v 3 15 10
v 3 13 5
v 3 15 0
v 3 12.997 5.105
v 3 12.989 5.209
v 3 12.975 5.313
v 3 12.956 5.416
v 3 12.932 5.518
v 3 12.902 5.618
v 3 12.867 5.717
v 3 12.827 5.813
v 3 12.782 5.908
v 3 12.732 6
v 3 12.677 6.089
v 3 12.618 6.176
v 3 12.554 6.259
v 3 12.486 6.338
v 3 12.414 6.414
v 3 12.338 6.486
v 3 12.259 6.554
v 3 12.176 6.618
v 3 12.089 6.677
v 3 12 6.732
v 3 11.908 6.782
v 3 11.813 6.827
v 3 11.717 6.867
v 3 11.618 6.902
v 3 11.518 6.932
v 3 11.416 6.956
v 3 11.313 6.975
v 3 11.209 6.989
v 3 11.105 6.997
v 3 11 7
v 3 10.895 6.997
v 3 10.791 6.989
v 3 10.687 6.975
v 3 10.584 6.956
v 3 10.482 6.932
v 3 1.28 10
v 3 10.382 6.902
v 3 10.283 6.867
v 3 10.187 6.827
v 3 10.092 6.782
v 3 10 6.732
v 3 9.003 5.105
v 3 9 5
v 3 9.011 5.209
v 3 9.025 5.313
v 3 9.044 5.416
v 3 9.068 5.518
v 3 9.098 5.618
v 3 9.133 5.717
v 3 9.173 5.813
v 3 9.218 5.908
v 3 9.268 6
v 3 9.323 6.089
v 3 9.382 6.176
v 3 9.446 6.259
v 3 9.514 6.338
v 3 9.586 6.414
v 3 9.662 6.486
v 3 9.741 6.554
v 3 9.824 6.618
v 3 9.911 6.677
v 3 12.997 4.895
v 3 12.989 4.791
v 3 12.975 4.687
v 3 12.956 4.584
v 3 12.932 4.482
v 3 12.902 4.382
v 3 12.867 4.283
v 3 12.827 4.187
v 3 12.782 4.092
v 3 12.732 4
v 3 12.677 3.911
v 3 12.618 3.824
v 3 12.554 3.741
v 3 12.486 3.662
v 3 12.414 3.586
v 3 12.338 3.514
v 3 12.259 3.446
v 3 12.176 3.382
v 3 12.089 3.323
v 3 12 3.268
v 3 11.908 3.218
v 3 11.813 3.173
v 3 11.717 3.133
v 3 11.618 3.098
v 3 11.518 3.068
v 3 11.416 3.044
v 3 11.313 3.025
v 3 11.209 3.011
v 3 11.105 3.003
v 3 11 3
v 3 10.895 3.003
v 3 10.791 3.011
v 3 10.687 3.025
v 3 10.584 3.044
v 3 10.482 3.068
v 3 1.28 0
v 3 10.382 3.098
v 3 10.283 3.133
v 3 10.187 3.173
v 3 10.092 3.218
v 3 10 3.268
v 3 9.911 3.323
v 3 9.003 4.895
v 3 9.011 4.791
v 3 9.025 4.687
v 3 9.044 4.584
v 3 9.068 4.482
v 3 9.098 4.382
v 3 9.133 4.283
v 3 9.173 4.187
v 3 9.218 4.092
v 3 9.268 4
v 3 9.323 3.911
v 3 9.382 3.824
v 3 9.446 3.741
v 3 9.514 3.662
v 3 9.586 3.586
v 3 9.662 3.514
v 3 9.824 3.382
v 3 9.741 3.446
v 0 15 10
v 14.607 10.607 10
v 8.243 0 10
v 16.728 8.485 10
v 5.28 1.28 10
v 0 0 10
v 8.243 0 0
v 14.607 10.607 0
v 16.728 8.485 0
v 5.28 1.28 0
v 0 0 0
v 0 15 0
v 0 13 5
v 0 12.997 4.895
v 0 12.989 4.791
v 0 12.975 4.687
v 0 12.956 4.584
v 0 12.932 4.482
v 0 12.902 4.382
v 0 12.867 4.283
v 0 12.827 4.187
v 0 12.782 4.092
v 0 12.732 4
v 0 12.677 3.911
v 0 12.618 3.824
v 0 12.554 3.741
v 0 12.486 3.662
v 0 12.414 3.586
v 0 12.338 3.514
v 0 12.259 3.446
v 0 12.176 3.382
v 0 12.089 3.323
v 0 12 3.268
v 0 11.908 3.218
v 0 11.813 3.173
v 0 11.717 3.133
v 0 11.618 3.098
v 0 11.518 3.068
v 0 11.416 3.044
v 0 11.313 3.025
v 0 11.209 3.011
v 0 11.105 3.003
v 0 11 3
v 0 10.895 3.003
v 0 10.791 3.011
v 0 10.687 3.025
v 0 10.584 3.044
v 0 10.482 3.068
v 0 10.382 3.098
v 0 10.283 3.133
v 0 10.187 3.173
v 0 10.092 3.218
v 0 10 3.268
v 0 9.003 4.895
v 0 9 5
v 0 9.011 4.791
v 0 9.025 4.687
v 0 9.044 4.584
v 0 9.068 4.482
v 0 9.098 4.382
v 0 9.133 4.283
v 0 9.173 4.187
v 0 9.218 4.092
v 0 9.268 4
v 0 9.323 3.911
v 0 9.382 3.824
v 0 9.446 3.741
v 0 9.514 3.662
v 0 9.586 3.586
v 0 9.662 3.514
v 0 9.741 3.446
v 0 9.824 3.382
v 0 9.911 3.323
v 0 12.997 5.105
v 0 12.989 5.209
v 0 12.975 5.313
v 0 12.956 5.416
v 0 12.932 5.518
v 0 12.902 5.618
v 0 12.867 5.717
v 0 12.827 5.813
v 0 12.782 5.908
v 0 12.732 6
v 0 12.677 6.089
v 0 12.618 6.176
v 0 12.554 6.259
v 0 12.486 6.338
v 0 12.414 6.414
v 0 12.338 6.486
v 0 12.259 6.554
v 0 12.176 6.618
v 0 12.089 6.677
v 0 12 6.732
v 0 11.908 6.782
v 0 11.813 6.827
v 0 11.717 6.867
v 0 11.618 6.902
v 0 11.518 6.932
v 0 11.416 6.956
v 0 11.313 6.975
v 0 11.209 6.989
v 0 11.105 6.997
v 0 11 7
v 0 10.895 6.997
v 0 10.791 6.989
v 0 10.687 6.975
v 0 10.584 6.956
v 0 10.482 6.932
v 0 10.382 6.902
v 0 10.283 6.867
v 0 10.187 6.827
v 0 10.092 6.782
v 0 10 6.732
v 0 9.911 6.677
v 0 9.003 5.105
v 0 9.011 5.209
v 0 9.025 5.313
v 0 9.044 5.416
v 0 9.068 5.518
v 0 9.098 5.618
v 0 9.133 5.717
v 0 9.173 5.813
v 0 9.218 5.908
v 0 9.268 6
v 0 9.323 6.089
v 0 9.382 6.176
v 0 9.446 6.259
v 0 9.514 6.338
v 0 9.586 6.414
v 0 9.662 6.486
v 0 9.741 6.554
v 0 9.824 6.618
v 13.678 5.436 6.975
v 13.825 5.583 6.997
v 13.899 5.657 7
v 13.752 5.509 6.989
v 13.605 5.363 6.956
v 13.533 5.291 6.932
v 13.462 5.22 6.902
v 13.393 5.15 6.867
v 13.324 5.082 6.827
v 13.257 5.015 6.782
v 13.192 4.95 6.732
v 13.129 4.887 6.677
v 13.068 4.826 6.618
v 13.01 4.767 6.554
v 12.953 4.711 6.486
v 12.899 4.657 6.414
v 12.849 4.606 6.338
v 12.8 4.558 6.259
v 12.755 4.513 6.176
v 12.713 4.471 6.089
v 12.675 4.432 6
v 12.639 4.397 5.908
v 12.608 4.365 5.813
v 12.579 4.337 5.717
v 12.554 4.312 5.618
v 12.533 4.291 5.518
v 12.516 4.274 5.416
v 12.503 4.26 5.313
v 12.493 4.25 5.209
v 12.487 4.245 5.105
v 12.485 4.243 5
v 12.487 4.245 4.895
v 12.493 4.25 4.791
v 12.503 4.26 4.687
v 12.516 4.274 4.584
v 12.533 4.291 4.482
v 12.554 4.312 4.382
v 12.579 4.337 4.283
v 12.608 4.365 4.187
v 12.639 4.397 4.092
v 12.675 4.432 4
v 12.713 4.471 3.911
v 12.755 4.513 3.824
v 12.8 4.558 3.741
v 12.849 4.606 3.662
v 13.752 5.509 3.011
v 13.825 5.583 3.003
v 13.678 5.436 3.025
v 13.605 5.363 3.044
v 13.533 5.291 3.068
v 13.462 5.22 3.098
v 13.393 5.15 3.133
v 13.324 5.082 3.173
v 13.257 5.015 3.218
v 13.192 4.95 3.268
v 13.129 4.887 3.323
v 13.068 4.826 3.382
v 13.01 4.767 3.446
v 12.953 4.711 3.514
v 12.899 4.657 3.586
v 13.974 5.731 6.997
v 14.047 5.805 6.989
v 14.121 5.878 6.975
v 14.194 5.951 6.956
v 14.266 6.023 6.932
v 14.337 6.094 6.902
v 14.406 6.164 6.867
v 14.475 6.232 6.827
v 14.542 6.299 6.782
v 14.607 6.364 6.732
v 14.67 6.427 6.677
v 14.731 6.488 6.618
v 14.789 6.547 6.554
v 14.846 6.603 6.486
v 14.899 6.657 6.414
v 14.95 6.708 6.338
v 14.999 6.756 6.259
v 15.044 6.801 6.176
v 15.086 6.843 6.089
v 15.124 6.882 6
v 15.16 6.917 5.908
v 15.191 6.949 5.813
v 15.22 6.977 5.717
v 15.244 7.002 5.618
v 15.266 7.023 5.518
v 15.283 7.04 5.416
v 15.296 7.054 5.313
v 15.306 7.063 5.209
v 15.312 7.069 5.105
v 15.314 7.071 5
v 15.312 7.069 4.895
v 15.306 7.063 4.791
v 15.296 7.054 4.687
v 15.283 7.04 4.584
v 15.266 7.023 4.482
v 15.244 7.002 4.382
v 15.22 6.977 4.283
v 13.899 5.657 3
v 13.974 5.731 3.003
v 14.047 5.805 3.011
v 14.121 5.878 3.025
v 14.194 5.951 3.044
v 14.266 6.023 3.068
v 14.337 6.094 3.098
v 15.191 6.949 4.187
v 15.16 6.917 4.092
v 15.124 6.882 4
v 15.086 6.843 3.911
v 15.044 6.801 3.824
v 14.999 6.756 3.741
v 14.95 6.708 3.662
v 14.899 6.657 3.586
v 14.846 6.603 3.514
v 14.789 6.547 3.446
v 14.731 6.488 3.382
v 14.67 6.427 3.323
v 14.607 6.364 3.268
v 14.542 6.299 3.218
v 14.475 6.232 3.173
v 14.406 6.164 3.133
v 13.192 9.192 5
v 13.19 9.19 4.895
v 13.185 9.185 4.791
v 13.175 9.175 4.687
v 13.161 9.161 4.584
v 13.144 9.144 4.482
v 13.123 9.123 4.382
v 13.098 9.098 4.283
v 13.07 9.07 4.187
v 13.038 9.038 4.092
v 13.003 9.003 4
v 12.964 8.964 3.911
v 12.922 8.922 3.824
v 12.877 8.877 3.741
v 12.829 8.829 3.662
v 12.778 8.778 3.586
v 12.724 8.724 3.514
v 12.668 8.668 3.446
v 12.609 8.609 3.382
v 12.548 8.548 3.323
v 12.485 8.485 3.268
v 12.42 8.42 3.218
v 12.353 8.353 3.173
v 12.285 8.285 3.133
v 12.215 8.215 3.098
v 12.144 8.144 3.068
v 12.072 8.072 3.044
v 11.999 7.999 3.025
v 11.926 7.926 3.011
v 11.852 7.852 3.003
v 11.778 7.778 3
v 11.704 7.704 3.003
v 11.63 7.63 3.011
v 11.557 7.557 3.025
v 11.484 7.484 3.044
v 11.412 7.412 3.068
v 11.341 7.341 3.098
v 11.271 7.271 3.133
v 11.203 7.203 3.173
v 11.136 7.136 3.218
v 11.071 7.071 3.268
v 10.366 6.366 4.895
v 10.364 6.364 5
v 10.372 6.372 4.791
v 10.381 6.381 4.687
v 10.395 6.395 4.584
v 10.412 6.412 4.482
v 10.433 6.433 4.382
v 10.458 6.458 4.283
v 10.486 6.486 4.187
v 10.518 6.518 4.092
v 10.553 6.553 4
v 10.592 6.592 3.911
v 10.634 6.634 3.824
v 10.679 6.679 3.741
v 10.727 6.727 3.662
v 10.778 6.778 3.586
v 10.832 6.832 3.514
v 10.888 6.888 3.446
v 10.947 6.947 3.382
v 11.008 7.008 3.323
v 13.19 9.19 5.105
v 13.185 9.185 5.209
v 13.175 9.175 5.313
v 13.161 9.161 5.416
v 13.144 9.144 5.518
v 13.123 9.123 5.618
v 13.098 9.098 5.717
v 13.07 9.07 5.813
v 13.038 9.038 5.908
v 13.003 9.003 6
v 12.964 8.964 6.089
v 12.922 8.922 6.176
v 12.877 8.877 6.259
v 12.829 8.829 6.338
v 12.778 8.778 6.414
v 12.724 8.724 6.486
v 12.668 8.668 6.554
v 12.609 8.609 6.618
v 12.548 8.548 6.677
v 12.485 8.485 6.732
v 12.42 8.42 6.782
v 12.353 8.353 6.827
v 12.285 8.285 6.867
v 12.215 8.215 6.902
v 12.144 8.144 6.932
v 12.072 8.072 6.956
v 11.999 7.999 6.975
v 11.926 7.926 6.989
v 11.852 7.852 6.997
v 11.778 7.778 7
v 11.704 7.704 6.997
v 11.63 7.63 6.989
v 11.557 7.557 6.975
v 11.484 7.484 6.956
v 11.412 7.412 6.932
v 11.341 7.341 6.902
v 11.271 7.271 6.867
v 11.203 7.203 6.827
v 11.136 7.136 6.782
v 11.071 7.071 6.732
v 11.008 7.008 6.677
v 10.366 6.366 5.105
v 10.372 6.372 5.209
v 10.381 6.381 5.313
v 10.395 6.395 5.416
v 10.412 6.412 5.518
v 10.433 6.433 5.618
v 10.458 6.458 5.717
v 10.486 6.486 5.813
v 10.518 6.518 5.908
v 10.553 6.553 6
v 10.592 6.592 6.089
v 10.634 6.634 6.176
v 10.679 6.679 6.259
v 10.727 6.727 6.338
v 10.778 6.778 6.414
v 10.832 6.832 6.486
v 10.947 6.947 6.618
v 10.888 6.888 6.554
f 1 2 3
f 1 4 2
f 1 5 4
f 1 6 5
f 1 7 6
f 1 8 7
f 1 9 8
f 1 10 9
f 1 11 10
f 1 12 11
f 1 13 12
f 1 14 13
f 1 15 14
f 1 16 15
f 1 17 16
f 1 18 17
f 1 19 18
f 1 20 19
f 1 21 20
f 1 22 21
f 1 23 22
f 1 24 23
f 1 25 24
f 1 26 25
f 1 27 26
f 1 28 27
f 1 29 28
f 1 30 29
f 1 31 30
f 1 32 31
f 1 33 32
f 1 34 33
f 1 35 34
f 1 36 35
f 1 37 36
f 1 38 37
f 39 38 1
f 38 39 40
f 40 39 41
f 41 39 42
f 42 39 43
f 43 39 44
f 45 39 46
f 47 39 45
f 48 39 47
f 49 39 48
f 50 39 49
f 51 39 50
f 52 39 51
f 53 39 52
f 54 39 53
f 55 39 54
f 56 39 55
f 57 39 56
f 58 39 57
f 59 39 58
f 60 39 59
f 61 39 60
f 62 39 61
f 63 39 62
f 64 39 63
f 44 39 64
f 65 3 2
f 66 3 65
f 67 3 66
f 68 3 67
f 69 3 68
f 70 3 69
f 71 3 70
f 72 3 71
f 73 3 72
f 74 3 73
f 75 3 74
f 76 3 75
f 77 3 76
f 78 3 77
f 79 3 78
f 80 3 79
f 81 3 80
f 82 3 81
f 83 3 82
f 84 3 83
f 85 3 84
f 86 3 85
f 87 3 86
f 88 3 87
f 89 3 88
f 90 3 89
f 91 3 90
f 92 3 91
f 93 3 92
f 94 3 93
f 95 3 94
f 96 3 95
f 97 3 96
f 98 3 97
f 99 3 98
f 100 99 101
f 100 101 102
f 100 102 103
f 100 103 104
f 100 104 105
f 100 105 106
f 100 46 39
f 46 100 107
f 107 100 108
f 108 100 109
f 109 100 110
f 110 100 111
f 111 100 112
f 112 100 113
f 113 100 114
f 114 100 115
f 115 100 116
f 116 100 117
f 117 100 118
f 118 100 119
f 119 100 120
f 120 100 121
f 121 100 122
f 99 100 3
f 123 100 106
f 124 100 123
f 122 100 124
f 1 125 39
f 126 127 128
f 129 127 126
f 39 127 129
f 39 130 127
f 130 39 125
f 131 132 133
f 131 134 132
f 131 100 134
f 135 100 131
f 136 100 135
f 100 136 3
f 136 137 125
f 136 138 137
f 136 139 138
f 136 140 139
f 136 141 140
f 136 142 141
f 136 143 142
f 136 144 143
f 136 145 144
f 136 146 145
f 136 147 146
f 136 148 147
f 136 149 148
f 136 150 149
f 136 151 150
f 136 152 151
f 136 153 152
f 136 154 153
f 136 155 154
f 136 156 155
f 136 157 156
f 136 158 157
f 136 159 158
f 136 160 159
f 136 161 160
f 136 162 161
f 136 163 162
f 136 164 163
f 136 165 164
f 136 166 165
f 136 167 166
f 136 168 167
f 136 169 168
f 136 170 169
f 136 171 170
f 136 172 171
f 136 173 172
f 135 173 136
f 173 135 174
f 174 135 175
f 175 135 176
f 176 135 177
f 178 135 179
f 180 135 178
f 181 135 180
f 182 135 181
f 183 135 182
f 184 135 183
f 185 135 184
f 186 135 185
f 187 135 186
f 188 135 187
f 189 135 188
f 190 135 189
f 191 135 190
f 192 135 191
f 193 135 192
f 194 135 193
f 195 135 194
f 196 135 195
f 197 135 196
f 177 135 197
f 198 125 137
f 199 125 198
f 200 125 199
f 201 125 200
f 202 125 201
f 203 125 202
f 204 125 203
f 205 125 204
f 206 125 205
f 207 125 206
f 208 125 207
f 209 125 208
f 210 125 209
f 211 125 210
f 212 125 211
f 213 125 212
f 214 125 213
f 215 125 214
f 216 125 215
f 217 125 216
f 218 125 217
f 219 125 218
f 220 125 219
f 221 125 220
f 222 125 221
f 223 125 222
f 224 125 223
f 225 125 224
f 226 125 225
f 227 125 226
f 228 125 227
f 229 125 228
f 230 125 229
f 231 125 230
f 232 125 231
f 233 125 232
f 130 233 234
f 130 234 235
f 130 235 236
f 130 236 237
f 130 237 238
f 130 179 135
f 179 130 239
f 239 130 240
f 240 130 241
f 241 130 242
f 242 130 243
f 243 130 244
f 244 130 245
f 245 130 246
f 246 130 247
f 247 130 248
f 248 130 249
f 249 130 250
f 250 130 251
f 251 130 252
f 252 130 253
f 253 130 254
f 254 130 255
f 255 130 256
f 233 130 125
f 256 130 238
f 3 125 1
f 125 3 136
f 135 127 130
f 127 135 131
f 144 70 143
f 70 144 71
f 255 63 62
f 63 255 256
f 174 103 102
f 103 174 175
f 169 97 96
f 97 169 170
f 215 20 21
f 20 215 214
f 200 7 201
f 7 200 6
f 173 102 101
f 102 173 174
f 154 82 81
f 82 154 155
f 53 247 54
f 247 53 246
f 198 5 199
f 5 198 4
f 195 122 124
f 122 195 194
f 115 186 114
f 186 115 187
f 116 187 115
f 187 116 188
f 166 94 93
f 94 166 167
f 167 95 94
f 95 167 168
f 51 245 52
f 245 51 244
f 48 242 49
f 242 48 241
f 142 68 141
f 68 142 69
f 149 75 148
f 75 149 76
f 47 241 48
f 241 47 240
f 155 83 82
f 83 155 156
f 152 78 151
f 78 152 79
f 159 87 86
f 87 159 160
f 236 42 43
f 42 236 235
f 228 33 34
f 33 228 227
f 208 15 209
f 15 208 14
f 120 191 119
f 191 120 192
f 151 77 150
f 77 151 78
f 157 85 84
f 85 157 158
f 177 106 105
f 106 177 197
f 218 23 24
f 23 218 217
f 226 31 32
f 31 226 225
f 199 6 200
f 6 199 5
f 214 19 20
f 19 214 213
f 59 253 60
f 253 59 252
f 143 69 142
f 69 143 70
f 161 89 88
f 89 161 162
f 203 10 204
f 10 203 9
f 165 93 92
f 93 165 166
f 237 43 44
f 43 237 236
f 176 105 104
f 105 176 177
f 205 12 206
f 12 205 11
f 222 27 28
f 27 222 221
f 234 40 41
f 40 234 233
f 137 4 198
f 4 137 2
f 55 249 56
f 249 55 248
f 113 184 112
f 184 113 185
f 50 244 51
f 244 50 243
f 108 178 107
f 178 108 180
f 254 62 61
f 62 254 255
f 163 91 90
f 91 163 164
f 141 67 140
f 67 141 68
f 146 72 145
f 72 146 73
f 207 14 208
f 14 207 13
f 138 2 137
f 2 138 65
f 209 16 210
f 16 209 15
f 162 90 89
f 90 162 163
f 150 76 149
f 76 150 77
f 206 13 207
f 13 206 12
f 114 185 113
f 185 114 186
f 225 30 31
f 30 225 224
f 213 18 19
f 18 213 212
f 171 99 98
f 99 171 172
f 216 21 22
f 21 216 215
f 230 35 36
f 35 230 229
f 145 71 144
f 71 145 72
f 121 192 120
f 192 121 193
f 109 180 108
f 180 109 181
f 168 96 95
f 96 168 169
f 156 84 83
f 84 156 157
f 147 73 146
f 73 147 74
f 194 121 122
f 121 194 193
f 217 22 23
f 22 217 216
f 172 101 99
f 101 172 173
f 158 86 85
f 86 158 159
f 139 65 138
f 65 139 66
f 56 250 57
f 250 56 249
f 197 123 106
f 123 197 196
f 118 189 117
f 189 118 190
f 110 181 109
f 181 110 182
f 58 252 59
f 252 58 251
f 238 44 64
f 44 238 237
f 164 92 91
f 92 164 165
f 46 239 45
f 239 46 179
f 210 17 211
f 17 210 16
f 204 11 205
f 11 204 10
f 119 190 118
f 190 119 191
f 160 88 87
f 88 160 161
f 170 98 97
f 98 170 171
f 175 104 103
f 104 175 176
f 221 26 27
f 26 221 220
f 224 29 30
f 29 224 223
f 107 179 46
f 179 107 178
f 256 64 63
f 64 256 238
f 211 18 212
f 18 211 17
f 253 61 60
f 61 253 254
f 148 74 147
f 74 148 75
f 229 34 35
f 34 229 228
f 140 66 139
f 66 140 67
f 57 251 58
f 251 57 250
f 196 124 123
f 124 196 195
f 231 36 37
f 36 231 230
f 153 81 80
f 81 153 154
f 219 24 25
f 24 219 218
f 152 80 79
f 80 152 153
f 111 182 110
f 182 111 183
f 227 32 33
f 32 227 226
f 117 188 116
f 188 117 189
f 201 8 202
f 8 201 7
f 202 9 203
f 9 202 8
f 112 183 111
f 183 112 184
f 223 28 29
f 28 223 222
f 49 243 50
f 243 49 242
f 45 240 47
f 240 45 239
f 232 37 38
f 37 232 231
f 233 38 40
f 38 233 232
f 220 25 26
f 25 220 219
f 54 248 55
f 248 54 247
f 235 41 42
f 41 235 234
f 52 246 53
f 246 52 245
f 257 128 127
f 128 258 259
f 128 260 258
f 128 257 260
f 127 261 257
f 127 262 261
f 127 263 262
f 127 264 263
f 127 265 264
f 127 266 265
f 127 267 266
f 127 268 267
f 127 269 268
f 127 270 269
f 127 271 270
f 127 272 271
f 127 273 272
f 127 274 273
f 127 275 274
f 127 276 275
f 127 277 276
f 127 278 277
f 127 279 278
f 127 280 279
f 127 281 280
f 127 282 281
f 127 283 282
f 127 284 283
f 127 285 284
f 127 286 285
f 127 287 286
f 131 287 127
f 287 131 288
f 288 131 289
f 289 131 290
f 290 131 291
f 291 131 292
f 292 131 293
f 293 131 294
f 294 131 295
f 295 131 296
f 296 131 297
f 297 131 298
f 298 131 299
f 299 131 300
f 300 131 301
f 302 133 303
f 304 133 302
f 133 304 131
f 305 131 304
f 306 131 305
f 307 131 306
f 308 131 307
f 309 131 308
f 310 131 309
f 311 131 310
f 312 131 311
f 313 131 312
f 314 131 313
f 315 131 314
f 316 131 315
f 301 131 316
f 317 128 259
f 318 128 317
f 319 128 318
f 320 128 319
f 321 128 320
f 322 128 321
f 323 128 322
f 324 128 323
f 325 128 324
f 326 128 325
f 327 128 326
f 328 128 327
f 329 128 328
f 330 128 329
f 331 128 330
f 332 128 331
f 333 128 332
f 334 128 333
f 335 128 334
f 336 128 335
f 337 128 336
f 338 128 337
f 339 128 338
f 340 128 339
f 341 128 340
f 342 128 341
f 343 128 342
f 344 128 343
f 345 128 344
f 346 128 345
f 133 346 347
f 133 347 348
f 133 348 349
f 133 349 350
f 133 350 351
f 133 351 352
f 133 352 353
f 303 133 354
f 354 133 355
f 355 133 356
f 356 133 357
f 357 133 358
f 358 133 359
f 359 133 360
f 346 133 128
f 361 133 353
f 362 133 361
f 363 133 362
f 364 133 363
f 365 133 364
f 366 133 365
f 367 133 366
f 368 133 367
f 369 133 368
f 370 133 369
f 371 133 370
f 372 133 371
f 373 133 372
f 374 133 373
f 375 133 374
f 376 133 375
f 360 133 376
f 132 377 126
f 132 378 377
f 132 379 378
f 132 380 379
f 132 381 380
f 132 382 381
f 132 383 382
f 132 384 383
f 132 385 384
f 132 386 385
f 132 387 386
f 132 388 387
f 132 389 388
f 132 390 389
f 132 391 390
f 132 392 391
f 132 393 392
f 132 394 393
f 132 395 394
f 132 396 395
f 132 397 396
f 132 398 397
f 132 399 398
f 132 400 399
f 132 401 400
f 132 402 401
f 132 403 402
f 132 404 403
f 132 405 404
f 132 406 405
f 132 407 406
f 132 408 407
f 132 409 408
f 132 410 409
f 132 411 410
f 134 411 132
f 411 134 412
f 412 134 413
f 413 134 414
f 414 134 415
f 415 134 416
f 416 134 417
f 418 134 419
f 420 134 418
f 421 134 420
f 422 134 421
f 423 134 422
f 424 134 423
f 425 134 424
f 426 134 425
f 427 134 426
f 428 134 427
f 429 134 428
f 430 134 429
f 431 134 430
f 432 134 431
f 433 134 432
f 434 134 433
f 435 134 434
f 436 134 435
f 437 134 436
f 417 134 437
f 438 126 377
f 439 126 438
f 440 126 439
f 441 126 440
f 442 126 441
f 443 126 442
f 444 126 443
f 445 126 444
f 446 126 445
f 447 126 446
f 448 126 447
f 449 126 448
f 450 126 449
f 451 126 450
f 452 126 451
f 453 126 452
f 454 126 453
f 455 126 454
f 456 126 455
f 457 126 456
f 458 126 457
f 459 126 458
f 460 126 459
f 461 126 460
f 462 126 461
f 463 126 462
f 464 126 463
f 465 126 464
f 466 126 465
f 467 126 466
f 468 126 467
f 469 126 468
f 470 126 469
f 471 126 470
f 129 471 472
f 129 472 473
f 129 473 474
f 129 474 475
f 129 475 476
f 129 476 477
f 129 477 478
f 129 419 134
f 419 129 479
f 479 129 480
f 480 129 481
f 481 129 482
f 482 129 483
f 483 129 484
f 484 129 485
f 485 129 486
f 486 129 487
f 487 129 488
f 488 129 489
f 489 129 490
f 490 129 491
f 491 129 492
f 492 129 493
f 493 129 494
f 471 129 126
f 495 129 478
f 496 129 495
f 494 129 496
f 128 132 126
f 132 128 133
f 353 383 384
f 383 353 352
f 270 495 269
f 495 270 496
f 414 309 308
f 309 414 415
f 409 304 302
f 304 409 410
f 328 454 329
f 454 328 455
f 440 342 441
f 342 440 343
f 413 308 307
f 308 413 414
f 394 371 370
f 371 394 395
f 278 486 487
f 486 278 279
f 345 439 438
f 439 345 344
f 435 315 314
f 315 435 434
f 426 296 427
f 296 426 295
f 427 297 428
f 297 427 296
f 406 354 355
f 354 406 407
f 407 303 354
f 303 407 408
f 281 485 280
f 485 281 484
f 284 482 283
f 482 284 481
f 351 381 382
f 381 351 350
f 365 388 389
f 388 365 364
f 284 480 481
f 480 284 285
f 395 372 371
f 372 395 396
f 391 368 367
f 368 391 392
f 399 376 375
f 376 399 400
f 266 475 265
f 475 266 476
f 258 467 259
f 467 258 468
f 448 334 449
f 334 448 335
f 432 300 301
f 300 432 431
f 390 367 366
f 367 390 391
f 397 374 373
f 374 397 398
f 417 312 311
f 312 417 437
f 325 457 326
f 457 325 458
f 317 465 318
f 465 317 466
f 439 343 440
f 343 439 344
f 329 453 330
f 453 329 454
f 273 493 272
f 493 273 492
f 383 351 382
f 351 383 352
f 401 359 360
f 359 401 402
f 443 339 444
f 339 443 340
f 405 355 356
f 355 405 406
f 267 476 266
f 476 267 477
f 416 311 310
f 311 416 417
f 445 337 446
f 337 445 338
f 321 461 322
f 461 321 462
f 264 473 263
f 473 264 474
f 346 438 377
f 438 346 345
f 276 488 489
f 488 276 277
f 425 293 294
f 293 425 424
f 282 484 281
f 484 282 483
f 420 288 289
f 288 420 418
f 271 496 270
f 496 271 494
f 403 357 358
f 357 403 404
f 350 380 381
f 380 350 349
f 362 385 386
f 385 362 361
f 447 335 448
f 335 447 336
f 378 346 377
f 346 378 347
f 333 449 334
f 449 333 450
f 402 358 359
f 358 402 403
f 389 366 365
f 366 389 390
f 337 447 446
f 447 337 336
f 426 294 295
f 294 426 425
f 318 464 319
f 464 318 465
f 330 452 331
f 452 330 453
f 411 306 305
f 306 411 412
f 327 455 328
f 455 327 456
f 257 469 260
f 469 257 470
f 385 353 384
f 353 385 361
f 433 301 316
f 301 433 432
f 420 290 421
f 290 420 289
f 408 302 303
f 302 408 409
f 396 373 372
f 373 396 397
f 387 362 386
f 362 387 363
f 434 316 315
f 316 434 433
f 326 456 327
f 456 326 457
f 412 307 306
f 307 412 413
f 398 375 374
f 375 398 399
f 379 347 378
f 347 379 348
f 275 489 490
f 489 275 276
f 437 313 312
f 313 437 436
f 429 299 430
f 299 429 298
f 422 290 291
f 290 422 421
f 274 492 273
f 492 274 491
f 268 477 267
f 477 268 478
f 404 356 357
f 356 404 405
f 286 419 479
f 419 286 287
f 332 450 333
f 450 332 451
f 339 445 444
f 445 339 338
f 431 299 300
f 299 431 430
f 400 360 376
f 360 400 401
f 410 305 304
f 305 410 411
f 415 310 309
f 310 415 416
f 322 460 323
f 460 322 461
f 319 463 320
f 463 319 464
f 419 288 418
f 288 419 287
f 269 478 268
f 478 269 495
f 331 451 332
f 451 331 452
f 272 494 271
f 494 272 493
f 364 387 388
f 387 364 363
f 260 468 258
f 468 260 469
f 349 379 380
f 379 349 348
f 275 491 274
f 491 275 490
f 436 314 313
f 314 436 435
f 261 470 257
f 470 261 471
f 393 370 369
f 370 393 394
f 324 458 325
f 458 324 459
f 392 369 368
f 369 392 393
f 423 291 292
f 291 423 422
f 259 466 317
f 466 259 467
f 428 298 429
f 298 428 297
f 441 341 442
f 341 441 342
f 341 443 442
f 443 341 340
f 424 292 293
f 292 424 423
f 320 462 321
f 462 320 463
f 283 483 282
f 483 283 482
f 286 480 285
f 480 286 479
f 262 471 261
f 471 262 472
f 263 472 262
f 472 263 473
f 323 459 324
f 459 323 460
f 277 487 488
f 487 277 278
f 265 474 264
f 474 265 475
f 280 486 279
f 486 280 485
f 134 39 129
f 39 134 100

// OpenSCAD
// file: config.scad
//General Settings
play=0.2; //to make fittings (add to some holes if nessesary)
//circle resolution 
$fa = 3;
$fs = 0.1;

aluminum = [0.9, 0.9, 0.9];
steel = [0.8, 0.8, 0.9];
wood="BurlyWood";

//Linear Guidance Settings
lg_d=70;//70  //distance      
lg_c=200;//200;  //away form center   
lg_holder_d=23;//15 //distace from holder to the mount joint  
ld_rod_d=10;

//Arms Settings
arm_n=3;
arm_d=50;//50  //distance
arm_l=300;//300; //length
arm_rod_d=5;//5  //rod diameter

//Joint Settings
joint_open_angel=120;
joint_b=16; 
joint_l=8;
joint_w=14;
joint_rh=30;
joint_hh=joint_l/sqrt(2);

//Platform
platform_c=33;//25 //mount away from center
platform_inner_r=15;
platform_outer_r=25;


//ISO/DIN Parts 
//Kugellager
kugellager_d=5+play;
kugellager_h=2.5+play;

//Mutter M2
M2_nut_d=4.38+2*play;
M2_nut_w=4+2*play;
M2_nut_h=1.6+2*play;

//Mutter M3
M3_nut_d=6.01+2*play;
M3_nut_w=5.5+2*play;
M3_nut_h=2.4+2*play;

//Mutter M4
M4_nut_d=7.66+2*play;
M4_nut_w=7+2*play;
M4_nut_h=3.2+2*play;

//Mutter M8
M8_nut_d=14.38+2*play;
M8_nut_w=13+2*play;
M8_nut_h=6.8+2*play;

//LMXXUU Linear Ball Bearing
LMXXUU_d=19;
LMXXUU_l=29;

//Pully 2.5
band_w=5;
band_b=2;
band_outer_d=13;
//Ballbearing opposit for pully
band_bb_id=5;
band_bb_od=11;
band_bb_w=4;

//Bearing
B608Z_od=22+2*play;
B608Z_id=8+2*play;
B608Z_isd=13;
B608Z_h=7;




//Nema17
nema17_od=42.3;
nema17_id=22+2*play;
nema17_screw_d=31;
nema17_l=48;
// main file
include <config.scad>

module cableholder(bwall=3,bflax=0.32*4,h=10,l=15,a=45)
{
	for(i=[0,1])
	{
		translate([i*(bwall+1),0,0])
		intersection()
		{
			cube([100,100,h]);
			rotate([0,0,-a*i])
			difference()
			{
				cube([bwall,l,h]);
				
				translate([0,l-4,h/2])
				rotate([0,90,0])
				translate([0,0,-1])
					cylinder(r=4/2,h=bwall+2);
			}
		}
	}
	
	cube([2*bwall+1,bflax,h]);
}

cableholder();
